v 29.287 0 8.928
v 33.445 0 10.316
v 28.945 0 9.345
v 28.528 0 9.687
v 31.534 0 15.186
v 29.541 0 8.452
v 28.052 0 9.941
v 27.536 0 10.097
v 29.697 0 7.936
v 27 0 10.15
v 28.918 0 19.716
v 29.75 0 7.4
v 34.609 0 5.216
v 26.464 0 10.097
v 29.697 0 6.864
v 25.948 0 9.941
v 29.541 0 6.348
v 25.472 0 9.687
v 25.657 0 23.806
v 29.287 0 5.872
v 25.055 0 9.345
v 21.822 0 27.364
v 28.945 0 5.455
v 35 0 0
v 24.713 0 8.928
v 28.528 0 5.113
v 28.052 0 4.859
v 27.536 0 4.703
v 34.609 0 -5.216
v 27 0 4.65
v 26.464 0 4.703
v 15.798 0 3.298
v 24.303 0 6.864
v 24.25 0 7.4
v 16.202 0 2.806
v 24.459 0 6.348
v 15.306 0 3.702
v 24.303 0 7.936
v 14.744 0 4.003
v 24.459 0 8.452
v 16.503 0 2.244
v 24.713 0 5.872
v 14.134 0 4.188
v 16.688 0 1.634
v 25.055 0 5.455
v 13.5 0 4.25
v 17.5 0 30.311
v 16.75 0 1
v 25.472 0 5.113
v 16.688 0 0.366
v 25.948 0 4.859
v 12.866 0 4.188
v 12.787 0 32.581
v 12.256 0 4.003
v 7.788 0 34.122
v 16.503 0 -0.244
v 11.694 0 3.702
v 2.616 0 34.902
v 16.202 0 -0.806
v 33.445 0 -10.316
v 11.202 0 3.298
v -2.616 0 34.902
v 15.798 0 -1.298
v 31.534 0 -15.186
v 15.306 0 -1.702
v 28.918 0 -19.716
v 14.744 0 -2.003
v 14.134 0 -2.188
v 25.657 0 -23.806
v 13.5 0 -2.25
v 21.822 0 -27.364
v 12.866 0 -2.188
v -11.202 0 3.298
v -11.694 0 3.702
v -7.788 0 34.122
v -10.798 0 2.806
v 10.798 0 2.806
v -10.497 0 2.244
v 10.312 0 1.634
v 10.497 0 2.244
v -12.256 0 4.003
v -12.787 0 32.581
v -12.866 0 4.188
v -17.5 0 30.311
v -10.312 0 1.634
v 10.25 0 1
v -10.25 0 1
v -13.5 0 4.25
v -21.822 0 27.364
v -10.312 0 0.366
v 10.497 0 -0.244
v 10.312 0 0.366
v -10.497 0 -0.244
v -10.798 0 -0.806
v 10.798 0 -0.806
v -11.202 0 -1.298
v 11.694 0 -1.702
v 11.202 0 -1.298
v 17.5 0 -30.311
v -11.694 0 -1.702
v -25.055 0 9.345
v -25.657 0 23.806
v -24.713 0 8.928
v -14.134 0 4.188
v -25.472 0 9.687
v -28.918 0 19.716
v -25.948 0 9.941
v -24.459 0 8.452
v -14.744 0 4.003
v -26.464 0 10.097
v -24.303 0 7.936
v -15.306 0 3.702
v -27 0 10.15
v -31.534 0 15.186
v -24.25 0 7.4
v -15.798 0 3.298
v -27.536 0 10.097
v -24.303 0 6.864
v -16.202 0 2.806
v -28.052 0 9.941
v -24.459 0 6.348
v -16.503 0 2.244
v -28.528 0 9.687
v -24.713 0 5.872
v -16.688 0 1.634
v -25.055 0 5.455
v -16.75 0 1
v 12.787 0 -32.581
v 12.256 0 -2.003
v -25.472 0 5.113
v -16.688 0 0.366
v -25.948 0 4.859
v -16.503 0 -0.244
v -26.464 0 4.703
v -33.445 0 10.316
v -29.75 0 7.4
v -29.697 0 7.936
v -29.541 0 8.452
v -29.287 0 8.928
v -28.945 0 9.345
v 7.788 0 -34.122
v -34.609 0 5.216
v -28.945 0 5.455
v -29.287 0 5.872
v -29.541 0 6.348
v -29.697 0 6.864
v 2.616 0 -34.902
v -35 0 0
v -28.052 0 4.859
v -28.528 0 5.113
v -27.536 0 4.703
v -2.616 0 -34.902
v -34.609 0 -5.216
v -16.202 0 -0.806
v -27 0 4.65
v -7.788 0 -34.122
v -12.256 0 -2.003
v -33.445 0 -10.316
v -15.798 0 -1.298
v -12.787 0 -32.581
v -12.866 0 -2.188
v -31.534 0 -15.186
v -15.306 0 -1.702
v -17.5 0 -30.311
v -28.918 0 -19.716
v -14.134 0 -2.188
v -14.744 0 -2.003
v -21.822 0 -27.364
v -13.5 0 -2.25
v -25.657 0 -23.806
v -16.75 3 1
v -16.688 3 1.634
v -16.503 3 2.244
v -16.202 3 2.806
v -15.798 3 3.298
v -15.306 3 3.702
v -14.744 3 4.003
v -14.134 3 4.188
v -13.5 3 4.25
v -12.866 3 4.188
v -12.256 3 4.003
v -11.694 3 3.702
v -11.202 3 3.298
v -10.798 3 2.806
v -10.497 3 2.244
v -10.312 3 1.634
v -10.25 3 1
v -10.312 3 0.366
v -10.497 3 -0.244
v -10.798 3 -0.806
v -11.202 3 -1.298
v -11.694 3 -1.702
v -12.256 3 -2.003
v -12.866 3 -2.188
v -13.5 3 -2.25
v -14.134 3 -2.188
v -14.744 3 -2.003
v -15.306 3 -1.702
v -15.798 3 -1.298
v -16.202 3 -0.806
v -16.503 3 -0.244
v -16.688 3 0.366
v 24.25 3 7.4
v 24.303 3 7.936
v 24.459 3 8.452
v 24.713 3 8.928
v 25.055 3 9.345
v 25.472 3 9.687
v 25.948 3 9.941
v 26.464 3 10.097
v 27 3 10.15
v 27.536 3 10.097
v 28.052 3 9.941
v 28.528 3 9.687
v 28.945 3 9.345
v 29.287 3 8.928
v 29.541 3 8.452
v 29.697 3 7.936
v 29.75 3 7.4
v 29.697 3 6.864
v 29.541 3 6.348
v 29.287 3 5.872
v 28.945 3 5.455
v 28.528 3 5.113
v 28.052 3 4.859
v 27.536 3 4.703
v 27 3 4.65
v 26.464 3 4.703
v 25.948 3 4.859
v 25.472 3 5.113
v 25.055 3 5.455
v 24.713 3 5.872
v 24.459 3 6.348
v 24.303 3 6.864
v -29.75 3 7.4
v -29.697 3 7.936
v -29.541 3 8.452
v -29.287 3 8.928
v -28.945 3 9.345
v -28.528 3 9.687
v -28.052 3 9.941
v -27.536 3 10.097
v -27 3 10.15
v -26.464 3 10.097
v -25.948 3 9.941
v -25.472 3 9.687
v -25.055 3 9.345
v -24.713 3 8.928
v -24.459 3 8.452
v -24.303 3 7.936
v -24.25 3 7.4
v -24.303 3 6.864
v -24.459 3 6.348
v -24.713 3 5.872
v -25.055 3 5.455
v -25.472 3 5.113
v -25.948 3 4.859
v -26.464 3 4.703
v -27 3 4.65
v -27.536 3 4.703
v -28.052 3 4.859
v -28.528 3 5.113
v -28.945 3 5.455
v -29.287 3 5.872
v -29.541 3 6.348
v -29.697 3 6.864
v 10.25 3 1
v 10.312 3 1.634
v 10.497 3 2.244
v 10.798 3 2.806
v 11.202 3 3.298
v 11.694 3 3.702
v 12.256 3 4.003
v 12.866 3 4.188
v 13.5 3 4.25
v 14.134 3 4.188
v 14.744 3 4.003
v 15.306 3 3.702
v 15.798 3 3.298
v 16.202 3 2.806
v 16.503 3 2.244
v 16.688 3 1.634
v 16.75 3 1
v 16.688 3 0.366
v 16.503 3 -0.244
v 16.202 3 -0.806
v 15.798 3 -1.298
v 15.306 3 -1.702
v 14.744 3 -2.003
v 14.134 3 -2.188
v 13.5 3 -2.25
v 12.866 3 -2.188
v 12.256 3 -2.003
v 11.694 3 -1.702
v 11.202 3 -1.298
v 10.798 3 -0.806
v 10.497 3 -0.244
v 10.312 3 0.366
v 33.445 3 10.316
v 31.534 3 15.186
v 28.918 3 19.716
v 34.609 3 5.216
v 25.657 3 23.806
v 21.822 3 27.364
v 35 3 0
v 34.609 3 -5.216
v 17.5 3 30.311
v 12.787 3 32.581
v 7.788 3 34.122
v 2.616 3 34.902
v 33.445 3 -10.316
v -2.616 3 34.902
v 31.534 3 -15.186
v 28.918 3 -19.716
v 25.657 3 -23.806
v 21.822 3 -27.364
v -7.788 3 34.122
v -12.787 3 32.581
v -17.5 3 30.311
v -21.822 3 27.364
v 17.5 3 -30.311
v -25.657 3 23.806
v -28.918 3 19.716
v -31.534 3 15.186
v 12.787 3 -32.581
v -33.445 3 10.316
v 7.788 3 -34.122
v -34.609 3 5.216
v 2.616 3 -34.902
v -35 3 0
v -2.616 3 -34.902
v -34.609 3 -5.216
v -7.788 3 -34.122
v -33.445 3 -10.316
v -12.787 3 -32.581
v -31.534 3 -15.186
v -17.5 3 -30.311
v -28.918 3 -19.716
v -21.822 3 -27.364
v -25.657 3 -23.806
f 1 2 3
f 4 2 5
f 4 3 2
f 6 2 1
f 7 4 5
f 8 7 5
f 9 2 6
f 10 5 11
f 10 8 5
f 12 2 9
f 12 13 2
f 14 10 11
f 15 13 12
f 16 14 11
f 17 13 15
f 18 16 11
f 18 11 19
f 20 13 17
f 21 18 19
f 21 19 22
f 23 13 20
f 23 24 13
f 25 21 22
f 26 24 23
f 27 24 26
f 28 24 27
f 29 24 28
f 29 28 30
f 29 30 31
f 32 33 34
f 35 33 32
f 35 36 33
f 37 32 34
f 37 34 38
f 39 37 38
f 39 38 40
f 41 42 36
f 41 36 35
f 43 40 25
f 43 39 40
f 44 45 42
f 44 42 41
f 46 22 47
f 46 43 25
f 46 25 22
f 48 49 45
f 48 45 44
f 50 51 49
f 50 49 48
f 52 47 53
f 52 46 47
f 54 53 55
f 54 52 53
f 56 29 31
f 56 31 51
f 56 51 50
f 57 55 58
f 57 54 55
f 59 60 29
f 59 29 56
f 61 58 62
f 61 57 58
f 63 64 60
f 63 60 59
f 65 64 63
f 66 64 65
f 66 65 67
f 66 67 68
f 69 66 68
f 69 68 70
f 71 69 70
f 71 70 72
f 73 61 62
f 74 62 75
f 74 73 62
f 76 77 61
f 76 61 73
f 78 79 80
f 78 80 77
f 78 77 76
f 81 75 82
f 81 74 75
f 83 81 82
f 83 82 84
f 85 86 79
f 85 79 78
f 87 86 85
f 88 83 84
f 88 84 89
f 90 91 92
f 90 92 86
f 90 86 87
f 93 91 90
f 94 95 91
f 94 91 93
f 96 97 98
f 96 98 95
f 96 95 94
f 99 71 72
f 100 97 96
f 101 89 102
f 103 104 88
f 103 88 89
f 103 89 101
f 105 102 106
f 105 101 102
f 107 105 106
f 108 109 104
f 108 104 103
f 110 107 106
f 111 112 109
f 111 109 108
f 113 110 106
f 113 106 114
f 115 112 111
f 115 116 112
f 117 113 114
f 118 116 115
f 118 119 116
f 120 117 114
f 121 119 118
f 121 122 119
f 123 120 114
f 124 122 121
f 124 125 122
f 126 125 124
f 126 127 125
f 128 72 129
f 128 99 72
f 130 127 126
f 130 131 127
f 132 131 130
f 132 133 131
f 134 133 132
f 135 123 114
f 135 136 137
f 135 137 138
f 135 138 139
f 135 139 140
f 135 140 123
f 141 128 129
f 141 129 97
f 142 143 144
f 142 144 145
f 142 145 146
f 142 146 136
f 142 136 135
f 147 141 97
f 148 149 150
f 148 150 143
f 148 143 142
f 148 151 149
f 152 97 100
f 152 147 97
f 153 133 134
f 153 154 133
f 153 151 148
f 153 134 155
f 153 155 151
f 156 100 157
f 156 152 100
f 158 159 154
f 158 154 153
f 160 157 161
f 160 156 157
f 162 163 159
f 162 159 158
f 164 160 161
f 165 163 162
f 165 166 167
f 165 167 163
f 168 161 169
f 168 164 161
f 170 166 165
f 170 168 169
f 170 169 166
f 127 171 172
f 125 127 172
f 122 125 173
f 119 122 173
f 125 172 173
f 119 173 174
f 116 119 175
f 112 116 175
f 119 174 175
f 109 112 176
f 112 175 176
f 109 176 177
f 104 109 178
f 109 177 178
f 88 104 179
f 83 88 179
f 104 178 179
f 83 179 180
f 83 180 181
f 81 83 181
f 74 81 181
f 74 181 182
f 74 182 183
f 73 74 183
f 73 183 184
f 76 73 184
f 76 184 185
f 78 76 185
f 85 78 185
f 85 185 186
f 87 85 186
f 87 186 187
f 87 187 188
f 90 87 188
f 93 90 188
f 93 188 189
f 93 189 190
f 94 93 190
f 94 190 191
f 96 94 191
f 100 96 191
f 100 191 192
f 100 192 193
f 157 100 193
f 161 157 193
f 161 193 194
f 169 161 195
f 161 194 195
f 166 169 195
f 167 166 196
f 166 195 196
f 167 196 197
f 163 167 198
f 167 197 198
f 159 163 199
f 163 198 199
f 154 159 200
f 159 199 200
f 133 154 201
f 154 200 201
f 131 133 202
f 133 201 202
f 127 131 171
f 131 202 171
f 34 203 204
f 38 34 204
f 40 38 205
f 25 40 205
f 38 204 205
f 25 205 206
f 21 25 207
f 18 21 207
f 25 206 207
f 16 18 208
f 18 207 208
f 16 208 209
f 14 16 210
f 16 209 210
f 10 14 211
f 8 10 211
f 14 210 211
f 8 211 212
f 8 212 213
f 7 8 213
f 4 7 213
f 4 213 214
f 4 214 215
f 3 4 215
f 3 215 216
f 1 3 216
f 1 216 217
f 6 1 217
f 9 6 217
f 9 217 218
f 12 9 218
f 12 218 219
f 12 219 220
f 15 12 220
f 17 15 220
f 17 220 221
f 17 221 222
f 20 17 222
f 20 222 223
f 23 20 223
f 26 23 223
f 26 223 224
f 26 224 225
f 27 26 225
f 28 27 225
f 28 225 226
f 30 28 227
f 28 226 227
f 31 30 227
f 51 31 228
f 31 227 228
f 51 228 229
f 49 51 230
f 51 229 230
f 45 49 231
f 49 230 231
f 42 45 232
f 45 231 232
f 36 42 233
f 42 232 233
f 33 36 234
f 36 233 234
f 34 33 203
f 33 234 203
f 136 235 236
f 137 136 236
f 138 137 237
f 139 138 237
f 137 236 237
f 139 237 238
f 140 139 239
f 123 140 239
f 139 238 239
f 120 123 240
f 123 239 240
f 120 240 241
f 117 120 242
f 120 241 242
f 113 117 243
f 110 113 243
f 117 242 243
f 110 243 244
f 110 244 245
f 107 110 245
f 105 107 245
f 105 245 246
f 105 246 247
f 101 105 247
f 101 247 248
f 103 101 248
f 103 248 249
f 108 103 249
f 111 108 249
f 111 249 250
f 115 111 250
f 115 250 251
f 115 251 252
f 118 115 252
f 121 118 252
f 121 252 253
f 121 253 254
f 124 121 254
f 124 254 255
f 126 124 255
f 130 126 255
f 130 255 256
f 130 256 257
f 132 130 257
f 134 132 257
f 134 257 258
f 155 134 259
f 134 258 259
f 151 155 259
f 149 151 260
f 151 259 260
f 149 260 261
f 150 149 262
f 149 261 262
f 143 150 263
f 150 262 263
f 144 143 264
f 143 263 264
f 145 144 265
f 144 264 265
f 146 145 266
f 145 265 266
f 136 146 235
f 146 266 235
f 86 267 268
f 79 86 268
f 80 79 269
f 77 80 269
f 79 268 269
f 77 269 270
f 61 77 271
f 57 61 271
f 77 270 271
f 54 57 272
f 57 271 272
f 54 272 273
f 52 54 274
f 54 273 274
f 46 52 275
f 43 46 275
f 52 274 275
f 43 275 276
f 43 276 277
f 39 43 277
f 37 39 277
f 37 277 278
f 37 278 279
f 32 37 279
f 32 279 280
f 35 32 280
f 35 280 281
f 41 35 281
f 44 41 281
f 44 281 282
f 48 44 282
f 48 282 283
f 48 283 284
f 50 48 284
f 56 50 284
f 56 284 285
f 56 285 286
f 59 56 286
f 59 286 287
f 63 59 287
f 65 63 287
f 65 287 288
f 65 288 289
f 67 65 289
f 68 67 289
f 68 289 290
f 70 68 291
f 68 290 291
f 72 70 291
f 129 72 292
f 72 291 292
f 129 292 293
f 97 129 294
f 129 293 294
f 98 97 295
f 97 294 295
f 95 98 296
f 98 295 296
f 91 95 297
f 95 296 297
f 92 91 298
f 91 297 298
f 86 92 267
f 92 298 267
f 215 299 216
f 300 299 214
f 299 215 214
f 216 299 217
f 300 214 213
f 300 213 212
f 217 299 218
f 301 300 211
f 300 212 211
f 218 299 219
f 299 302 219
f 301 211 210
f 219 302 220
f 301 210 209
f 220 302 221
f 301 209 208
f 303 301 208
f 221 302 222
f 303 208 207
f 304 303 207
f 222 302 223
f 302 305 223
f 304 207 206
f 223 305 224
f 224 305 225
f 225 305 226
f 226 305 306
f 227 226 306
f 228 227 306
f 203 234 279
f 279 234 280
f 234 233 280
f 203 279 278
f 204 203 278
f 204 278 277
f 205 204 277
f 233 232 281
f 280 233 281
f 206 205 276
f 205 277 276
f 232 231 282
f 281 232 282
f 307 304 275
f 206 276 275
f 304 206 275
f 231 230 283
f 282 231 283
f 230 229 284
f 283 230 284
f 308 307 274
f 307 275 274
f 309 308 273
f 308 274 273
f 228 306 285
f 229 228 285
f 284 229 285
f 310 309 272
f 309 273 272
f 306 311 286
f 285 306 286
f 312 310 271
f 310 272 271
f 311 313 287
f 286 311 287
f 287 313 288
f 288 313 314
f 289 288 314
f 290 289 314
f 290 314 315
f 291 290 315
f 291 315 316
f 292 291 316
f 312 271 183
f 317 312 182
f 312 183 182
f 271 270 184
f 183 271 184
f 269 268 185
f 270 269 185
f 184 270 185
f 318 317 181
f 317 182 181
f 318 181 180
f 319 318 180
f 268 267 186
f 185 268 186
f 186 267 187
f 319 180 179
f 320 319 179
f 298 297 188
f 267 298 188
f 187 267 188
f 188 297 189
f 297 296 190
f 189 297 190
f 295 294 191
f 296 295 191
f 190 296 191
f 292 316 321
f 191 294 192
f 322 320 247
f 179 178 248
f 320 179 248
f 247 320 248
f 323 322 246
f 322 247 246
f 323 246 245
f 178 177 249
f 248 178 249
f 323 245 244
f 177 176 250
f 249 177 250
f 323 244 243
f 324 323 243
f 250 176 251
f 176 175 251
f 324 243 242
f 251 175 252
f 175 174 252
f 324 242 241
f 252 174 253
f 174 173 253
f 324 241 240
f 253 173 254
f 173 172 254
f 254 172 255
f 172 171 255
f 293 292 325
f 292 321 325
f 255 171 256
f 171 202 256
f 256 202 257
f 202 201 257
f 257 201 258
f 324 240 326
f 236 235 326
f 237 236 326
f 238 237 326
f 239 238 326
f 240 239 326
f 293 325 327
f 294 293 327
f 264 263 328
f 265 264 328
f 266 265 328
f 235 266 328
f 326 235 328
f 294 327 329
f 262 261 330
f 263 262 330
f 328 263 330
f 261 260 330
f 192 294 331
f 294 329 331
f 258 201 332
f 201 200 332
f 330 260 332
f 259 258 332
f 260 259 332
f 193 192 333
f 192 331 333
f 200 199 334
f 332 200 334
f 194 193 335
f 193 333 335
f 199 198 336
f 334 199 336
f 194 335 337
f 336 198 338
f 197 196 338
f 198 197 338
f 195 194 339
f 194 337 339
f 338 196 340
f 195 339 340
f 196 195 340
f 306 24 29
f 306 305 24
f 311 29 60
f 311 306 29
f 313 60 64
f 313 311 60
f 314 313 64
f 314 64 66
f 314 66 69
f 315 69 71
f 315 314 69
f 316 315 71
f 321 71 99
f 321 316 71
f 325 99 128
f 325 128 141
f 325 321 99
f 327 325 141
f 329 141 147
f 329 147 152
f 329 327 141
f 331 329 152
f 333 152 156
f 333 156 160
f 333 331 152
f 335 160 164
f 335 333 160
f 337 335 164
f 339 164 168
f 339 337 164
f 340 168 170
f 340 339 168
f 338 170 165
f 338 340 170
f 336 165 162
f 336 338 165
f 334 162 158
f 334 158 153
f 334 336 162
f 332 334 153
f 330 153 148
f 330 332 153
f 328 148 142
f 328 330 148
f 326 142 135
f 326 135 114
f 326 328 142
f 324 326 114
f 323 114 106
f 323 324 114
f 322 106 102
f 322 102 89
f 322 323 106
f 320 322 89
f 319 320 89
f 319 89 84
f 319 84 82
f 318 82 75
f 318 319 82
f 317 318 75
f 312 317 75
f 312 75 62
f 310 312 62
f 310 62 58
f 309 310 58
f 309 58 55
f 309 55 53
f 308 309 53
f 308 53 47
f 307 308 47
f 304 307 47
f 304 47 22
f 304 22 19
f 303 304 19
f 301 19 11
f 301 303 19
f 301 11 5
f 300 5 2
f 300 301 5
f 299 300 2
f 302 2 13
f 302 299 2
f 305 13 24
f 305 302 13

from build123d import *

# Parameters (mm, degrees)
SKETCH2_W          = 35
SKETCH2_H          = 3
CUT_EXTRUDE1_REACH = 51.588
SKETCH3_R          = 3.25
CUT_EXTRUDE2_REACH = 51.588
SKETCH4_R          = 2.75


with BuildPart() as part:
    # Sketch2 → Revolve1 (revolve)
    with BuildSketch(Plane.XY):
        with Locations((17.5, 1.5)):
            Rectangle(SKETCH2_W, SKETCH2_H)
    revolve(axis=Axis((0, -417.112175525, 0), (0, 1, 0)))

    # Sketch3 → Cut-Extrude1 (cut, up to next)
    with BuildSketch(Plane(origin=(0, 3, 0), x_dir=(1, 0, 0), z_dir=(0, 1, 0)), mode=Mode.PRIVATE) as cut_extrude1_sk1:
        with Locations(Location((-13.5, -1, 0), (0, 0, 180))):
            Circle(SKETCH3_R)
    cut_extrude1_tool1 = extrude(cut_extrude1_sk1.sketch, amount=-CUT_EXTRUDE1_REACH, mode=Mode.PRIVATE) & part.part
    # Sketch3 → Cut-Extrude1 (cut, up to next)
    with BuildSketch(Plane(origin=(0, 3, 0), x_dir=(1, 0, 0), z_dir=(0, 1, 0)), mode=Mode.PRIVATE) as cut_extrude1_sk2:
        with Locations(Location((13.5, -1, 0), (0, 0, 180))):
            Circle(SKETCH3_R)
    cut_extrude1_tool2 = extrude(cut_extrude1_sk2.sketch, amount=-CUT_EXTRUDE1_REACH, mode=Mode.PRIVATE) & part.part
    add(cut_extrude1_tool1.solids().sort_by_distance((-13.5, 3, 1))[0], mode=Mode.SUBTRACT)
    add(cut_extrude1_tool2.solids().sort_by_distance((13.5, 3, 1))[0], mode=Mode.SUBTRACT)

    # Sketch4 → Cut-Extrude2 (cut, up to next)
    with BuildSketch(Plane(origin=(0, 3, 0), x_dir=(1, 0, 0), z_dir=(0, 1, 0)), mode=Mode.PRIVATE) as cut_extrude2_sk1:
        with Locations(Location((-27, -7.4, 0), (0, 0, 180))):
            Circle(SKETCH4_R)
    cut_extrude2_tool1 = extrude(cut_extrude2_sk1.sketch, amount=-CUT_EXTRUDE2_REACH, mode=Mode.PRIVATE) & part.part
    # Sketch4 → Cut-Extrude2 (cut, up to next)
    with BuildSketch(Plane(origin=(0, 3, 0), x_dir=(1, 0, 0), z_dir=(0, 1, 0)), mode=Mode.PRIVATE) as cut_extrude2_sk2:
        with Locations(Location((27, -7.4, 0), (0, 0, 180))):
            Circle(SKETCH4_R)
    cut_extrude2_tool2 = extrude(cut_extrude2_sk2.sketch, amount=-CUT_EXTRUDE2_REACH, mode=Mode.PRIVATE) & part.part
    add(cut_extrude2_tool1.solids().sort_by_distance((-27, 3, 7.4))[0], mode=Mode.SUBTRACT)
    add(cut_extrude2_tool2.solids().sort_by_distance((27, 3, 7.4))[0], mode=Mode.SUBTRACT)


solid = part.part
